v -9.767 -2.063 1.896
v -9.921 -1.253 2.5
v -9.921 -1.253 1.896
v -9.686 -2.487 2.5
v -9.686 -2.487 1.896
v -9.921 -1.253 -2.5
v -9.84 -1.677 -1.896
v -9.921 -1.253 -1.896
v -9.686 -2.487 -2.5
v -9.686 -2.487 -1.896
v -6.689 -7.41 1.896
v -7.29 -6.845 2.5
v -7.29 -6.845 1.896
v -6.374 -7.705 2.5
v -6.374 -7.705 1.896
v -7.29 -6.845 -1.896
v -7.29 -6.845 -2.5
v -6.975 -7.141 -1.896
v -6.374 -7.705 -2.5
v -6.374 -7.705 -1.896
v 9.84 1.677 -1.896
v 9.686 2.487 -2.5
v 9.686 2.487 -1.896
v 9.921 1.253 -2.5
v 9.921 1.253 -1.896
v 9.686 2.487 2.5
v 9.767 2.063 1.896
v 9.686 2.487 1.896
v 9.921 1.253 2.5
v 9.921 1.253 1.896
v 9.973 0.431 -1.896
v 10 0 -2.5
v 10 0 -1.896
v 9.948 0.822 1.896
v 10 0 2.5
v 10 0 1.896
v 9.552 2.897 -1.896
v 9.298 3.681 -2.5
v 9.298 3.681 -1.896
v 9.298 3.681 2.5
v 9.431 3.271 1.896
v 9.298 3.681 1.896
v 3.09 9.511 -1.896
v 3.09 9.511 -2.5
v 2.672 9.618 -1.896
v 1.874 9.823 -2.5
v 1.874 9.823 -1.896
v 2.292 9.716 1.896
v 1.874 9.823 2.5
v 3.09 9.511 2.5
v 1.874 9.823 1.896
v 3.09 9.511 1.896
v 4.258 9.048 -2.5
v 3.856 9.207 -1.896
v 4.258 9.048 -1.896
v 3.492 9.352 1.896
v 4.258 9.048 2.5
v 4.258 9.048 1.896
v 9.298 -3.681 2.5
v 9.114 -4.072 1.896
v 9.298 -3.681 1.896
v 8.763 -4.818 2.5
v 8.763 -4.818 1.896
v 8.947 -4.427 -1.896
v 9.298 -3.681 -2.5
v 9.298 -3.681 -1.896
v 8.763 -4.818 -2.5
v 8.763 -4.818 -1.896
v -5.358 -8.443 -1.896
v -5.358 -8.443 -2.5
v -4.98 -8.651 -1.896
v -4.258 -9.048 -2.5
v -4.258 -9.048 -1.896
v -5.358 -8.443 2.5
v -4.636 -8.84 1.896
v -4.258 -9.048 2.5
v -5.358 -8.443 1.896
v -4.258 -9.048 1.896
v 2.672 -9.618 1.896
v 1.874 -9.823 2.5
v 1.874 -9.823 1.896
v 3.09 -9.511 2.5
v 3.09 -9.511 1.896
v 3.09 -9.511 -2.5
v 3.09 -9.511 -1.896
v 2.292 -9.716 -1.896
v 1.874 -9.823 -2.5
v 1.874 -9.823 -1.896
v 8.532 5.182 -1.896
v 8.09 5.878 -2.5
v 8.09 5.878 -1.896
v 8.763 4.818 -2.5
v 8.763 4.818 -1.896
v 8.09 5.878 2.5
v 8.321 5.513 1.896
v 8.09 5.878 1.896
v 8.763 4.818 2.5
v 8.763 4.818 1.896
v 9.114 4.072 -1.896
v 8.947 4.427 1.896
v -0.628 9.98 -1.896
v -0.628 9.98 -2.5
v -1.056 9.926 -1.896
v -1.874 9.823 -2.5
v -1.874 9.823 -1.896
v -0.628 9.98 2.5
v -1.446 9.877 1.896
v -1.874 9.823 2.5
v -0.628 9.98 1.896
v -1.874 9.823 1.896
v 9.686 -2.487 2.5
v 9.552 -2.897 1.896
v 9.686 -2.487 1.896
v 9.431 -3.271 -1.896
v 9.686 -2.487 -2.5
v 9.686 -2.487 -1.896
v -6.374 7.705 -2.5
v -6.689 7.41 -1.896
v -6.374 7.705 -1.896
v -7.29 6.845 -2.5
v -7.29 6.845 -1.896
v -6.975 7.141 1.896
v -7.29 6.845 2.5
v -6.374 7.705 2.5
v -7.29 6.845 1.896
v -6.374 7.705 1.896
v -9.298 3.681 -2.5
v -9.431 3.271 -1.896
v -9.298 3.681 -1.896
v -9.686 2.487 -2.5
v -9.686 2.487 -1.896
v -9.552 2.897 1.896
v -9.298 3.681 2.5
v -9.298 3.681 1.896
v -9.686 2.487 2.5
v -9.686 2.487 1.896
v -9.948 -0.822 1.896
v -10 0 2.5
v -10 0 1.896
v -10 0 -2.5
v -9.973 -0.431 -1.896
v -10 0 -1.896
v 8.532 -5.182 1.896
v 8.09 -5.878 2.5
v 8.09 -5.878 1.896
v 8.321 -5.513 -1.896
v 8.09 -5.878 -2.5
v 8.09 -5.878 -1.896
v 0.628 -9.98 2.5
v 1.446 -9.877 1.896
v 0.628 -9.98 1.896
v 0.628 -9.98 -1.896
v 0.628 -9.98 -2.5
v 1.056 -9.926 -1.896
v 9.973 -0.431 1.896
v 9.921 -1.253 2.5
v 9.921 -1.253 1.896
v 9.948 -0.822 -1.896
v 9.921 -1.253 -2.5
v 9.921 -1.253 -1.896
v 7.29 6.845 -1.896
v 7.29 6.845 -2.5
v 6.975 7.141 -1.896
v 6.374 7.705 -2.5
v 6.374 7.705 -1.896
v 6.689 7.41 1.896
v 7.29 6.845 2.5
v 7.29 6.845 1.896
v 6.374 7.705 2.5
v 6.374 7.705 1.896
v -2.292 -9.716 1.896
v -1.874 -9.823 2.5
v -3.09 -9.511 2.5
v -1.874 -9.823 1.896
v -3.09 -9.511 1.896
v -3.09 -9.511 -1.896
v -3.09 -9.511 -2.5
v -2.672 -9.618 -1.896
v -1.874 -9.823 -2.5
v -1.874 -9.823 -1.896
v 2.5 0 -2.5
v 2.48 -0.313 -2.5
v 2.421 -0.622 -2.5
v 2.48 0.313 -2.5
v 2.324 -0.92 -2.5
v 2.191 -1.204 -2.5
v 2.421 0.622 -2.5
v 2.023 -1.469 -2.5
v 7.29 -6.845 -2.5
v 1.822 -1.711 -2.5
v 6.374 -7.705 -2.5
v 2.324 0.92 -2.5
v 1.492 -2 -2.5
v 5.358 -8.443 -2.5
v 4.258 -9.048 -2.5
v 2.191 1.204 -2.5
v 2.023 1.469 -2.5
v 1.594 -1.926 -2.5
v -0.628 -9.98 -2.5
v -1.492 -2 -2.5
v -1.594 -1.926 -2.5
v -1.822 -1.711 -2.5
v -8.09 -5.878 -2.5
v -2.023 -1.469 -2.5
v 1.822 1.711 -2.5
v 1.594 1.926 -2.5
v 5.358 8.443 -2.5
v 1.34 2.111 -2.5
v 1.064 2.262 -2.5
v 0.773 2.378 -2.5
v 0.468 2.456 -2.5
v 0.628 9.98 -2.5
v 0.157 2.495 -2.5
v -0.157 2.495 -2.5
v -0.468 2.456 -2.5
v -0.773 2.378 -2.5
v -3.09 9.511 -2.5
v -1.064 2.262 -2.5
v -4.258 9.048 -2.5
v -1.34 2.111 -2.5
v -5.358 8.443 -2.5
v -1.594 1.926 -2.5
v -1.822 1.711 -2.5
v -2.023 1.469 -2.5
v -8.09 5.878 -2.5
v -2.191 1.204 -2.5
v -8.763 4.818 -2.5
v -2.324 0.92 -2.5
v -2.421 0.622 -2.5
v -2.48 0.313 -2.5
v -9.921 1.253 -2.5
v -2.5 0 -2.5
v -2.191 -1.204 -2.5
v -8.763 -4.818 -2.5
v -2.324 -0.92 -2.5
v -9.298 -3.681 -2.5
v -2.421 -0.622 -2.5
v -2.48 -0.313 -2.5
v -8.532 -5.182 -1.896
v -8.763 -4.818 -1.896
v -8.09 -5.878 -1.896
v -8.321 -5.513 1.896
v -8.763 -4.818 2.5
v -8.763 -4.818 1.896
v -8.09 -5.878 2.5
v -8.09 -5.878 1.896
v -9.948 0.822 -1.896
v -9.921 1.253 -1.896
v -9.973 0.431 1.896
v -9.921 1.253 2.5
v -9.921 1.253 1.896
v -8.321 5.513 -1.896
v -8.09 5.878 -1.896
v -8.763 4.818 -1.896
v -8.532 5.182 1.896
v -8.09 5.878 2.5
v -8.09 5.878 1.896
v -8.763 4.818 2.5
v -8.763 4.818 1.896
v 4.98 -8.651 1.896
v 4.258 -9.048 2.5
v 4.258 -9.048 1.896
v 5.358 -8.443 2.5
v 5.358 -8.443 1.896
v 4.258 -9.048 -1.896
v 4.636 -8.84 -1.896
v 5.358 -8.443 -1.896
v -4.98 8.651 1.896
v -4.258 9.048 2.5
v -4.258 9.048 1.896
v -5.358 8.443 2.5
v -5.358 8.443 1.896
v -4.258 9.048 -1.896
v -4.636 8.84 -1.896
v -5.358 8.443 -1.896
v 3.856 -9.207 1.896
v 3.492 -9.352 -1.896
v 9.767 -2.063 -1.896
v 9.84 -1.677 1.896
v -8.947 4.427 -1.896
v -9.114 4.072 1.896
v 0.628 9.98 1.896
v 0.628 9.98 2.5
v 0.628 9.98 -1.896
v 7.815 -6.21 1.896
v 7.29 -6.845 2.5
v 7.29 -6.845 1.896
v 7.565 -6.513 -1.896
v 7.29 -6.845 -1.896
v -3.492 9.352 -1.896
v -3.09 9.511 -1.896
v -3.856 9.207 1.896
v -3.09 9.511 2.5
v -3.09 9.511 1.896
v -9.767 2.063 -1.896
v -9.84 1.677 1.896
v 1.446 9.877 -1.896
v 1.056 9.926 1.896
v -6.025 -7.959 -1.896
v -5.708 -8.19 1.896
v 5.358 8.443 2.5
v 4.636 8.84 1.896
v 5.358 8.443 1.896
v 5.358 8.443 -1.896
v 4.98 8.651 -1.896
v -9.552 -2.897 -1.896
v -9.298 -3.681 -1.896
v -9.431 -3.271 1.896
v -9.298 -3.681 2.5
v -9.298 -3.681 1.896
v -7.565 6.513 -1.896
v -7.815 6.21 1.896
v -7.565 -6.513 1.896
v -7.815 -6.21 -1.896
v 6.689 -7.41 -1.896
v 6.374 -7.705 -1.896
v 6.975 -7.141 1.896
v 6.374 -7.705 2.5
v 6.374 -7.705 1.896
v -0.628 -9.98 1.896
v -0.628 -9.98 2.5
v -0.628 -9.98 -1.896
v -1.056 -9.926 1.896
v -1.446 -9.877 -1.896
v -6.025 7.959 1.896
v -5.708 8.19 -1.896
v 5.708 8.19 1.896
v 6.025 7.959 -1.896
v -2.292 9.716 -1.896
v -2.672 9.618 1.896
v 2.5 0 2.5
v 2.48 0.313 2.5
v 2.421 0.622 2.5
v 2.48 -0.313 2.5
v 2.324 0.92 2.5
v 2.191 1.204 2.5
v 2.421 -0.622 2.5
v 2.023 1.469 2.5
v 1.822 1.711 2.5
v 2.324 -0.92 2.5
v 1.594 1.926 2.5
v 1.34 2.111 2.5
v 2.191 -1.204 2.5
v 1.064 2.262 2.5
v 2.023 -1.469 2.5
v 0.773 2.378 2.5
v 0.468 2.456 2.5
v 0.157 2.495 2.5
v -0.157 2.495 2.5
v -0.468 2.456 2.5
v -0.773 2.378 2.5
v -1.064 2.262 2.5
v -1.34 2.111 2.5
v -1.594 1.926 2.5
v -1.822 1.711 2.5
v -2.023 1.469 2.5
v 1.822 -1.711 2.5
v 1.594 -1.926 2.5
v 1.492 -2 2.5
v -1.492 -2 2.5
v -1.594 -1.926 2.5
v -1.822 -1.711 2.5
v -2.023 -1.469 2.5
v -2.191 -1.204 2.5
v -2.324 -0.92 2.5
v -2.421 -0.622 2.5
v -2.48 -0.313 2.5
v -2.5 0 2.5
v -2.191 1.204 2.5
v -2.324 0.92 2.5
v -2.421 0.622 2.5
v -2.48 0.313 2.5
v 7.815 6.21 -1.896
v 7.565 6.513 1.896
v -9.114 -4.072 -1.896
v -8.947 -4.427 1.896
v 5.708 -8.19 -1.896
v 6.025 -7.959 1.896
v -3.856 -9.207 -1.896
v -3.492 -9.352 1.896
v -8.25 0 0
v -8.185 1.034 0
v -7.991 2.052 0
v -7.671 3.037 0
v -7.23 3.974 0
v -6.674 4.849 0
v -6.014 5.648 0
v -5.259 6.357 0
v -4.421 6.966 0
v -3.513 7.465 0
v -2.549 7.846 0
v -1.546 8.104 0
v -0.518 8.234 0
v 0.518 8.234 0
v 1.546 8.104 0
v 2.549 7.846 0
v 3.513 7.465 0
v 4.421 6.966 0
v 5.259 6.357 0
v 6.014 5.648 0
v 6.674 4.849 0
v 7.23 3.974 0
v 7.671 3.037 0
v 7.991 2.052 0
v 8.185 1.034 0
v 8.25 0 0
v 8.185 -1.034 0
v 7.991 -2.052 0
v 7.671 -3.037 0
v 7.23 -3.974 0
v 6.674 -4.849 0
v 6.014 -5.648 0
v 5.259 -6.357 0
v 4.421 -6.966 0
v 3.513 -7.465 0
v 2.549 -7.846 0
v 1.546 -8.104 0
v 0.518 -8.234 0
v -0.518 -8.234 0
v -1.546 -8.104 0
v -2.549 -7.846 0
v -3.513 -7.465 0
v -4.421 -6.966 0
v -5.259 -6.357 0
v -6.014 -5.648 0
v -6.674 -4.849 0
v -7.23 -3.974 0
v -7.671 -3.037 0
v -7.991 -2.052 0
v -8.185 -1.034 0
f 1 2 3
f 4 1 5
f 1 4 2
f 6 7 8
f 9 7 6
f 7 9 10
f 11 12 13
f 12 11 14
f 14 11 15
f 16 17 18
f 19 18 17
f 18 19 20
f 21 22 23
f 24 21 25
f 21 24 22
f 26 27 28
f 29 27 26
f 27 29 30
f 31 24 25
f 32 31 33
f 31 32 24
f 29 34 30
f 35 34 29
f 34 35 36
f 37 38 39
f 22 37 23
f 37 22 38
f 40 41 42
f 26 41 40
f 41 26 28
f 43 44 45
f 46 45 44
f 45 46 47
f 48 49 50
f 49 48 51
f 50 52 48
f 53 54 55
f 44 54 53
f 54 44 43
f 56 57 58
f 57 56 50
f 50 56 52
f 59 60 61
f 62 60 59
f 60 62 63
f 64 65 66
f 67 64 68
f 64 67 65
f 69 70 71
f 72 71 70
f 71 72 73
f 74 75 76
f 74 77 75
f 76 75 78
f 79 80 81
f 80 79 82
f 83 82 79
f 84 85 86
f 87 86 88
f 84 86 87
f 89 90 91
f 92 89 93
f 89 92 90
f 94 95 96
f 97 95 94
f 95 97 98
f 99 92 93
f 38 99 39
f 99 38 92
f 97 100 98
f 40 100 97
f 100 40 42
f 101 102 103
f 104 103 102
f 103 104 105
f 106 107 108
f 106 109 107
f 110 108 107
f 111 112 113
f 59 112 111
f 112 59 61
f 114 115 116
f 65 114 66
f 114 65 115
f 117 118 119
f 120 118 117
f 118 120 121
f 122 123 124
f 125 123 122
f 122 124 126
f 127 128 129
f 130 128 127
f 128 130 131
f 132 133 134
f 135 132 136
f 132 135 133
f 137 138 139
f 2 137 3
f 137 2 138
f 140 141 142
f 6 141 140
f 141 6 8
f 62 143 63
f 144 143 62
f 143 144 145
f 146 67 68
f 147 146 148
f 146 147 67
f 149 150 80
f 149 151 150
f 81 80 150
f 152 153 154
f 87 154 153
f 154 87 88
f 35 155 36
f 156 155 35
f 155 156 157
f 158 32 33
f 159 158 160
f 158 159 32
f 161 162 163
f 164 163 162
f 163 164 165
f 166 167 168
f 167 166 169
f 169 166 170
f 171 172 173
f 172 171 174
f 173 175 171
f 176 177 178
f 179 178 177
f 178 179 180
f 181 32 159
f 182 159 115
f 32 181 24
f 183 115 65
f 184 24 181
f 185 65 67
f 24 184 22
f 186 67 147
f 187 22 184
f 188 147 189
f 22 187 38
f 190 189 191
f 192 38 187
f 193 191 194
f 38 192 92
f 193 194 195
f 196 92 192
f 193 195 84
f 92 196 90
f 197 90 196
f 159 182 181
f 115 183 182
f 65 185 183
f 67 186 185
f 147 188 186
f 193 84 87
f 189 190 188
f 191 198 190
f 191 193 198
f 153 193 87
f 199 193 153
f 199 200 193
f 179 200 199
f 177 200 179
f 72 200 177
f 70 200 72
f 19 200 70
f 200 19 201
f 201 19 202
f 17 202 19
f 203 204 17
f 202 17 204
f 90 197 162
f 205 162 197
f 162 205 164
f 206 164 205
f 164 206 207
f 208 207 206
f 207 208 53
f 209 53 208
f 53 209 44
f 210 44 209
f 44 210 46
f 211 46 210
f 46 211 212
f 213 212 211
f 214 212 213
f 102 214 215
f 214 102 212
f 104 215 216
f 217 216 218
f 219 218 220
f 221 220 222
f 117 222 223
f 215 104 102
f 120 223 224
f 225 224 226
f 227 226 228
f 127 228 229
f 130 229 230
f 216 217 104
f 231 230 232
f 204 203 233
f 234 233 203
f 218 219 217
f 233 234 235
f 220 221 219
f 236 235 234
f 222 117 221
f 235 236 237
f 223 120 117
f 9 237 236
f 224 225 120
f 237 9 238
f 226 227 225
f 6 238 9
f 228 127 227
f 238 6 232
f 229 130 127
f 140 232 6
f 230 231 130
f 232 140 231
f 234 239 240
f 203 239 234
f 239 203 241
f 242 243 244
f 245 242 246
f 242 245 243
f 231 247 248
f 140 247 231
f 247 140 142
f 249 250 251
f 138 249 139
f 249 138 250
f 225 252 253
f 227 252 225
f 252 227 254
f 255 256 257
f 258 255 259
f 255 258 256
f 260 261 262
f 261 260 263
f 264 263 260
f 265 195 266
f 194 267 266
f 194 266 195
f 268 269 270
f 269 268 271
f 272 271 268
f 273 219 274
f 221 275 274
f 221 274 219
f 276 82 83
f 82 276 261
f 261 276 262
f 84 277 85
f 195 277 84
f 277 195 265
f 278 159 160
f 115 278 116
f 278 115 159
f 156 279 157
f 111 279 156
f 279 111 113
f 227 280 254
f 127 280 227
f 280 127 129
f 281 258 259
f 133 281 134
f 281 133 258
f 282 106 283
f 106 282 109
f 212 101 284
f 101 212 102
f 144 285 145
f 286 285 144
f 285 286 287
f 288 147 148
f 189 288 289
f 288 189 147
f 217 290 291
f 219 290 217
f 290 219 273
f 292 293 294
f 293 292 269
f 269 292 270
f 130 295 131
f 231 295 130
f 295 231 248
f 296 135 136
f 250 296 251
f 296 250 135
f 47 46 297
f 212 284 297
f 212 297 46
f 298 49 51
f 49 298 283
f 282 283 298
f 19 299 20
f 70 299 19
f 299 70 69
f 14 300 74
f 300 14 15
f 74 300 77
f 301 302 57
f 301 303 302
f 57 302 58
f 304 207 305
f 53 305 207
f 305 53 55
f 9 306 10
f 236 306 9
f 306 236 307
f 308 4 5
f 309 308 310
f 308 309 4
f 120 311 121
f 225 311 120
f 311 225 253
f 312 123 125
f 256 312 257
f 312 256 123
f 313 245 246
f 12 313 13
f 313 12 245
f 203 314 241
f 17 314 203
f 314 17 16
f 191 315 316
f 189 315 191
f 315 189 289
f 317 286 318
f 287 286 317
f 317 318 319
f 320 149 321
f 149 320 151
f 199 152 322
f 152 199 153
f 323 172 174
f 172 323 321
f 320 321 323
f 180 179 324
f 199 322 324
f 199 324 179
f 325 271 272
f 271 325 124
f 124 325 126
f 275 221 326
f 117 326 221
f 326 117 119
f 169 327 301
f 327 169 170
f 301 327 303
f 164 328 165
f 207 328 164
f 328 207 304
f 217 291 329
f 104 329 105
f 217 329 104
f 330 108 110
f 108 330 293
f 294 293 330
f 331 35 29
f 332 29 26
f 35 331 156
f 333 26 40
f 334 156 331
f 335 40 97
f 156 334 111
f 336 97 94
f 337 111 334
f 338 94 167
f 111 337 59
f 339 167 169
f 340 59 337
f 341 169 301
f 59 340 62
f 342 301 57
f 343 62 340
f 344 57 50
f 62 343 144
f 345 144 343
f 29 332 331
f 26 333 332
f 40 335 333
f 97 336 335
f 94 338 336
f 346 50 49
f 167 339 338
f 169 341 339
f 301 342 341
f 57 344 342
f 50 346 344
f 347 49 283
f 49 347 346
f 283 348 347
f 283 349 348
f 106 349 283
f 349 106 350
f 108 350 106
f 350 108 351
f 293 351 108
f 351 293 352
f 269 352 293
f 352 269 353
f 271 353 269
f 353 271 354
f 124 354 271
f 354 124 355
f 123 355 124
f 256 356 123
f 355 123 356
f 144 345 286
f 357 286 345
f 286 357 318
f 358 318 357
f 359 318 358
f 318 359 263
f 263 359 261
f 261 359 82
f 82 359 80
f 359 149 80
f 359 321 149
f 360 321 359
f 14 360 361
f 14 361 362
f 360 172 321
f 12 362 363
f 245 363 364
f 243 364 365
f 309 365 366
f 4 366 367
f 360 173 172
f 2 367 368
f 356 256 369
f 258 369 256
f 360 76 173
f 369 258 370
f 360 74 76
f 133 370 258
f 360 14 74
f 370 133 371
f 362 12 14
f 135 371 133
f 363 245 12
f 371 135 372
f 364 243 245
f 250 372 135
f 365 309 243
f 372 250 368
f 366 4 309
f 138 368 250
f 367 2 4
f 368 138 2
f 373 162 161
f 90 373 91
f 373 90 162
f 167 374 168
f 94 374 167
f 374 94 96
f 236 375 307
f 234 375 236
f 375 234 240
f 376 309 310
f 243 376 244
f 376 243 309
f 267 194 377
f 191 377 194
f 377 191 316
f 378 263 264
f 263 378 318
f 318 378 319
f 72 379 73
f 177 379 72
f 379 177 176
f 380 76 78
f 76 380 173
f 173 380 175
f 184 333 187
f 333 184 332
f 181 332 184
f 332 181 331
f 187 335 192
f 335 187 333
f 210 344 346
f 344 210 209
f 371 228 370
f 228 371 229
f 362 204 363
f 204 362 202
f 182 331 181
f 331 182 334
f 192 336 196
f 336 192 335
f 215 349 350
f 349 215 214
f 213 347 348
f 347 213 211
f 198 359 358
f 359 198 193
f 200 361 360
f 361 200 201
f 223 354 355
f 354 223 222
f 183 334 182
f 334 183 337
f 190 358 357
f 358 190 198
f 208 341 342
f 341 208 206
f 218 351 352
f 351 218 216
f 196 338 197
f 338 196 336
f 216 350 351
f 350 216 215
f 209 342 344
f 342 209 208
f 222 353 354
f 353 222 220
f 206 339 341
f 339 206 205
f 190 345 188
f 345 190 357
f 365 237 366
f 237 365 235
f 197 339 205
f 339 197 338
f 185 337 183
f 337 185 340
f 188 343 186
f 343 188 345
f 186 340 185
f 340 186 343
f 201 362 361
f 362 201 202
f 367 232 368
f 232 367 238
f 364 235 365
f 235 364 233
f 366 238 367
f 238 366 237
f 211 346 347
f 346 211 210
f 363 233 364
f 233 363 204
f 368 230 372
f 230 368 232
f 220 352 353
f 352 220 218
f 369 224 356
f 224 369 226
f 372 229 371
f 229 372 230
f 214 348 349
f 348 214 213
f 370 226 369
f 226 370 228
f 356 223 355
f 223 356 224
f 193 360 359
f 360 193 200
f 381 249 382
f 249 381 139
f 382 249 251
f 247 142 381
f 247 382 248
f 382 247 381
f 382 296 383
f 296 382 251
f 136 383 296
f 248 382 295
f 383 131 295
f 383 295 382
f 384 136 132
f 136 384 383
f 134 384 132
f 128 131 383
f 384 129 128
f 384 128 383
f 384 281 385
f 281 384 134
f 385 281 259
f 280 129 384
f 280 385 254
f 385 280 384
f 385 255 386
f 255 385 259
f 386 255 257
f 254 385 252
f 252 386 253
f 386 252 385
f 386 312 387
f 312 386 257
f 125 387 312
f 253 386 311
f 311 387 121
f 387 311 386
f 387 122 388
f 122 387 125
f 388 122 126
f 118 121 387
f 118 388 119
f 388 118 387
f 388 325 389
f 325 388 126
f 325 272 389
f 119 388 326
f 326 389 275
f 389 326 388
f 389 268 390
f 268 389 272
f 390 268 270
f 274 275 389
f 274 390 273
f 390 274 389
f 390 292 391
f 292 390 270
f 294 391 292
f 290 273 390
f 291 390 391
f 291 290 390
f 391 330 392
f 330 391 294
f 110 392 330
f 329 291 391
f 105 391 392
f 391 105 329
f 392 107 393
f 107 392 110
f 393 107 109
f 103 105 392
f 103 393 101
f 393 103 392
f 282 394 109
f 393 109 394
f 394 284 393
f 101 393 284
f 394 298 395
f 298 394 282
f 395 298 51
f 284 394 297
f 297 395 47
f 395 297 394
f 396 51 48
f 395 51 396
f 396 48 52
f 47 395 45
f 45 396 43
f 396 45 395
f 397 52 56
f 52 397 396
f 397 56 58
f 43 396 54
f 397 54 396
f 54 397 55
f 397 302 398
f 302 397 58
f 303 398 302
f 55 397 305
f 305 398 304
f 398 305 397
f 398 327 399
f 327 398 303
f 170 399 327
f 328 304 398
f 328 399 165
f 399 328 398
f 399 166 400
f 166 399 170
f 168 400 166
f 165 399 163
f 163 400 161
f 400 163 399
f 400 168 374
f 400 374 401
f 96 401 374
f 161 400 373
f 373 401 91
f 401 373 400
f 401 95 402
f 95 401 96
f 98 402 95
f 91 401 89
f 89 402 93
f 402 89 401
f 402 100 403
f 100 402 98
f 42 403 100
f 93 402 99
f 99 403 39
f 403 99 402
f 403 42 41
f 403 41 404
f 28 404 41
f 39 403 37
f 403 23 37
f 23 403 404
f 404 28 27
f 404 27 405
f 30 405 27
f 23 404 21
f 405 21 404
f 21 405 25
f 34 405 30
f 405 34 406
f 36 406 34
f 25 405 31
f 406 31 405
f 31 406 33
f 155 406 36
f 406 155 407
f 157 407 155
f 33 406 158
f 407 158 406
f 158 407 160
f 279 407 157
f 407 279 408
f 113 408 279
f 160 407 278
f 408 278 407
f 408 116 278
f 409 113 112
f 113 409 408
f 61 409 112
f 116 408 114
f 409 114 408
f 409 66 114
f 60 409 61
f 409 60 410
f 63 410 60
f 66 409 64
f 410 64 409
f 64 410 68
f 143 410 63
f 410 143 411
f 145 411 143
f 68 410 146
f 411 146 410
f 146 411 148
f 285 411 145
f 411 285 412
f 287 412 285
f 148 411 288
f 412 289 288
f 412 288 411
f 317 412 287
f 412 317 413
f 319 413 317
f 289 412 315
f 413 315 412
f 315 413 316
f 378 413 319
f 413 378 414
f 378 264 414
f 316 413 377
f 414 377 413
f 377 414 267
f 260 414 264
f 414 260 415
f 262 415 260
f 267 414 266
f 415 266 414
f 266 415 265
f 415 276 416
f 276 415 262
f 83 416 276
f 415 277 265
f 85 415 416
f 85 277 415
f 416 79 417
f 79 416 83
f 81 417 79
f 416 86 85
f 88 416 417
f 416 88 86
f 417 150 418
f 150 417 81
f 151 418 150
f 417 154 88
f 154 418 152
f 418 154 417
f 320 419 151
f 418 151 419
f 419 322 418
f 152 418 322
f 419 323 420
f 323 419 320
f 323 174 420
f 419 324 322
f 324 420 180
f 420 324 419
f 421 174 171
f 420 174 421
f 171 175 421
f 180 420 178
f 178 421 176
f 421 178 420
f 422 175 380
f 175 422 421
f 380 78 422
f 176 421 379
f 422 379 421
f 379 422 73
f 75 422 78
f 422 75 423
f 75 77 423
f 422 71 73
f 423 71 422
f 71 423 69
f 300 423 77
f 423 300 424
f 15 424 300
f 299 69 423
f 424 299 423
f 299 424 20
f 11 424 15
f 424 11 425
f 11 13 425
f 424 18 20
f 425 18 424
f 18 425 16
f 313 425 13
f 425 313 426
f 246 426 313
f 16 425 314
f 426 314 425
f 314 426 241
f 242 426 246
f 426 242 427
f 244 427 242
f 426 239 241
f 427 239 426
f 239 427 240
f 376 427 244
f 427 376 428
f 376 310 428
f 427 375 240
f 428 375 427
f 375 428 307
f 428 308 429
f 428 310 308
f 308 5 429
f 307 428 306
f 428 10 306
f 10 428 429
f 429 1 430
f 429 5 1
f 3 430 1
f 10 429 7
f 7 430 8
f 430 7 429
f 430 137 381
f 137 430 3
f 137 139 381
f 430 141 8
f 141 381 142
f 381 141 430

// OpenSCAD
PRECISION = 50;

R = 20/2;
HEIGHT = 5;

HOLE_HEIGHT = 6;
HOLE_D = 5;
HOLE_R = HOLE_D/2;

FLAT_DEPTH = 0.5;
FLAT_WIDTH = HOLE_R;
FLAT_SHIFT = -FLAT_WIDTH/2 - HOLE_R + FLAT_DEPTH;

GROOVE_WIDTH = 6.5; // nominal 3.25;
GROOVE_DEPTH_NOM = 1.75;
GROOVE_DEPTH = 3;
GROOVE_R = R - GROOVE_DEPTH_NOM;

difference() {
    union()
    {
        difference() {
            cylinder( h=HEIGHT, r1=R, r2=R, center=true, $fn=PRECISION );
            cylinder( h=HOLE_HEIGHT, r1=HOLE_R, r2=HOLE_R, center=true, $fn=PRECISION );
        }
        
        translate( [0, FLAT_SHIFT, 0] ) {
            cube([ HOLE_D, FLAT_WIDTH, HEIGHT], center=true);
        }
    }

    rotate_extrude(angle = 360, convexity = 2, $fn=PRECISION ) {
        translate([GROOVE_R,0,0]) {
            polygon( points = [ [0,0], [GROOVE_DEPTH,-GROOVE_WIDTH/2], [GROOVE_DEPTH,GROOVE_WIDTH/2] ] );
        }
    }
}


//    rotate_extrude(angle = 360, convexity = 2) {
        //translate([GROOVE_R,0,0]) {
            //polygon( points = [ [0,0], [GROOVE_DEPTH,-GROOVE_WIDTH/2], [GROOVE_DEPTH,GROOVE_WIDTH/2] ] );
        //}
    //}
//rotate_extrude(angle = 360, convexity = 2) {
//translate([5,0,0]) {
    //polygon( points = [ [0,0], [-GROOVE_WIDTH/2,GROOVE_HEIGHT], [GROOVE_WIDTH/2, GROOVE_HEIGHT] ] );
//}
//}

//rotate_extrude(convexity = 10){
//translate([2, 0, 0])
    //{circle(r = 1); }
//}

//translate([20,0,0]){
    //rotate_extrude(angle = 360, convexity = 2) {
    //translate([10,0,GROOVE_WIDTH/2]) {
        //rotate([0,90,90]){
            //polygon( points = [ [0,0], [-GROOVE_WIDTH/2,0], [GROOVE_WIDTH/2, GROOVE_HEIGHT] ] );            
        //}
    //}
    //}
//}
